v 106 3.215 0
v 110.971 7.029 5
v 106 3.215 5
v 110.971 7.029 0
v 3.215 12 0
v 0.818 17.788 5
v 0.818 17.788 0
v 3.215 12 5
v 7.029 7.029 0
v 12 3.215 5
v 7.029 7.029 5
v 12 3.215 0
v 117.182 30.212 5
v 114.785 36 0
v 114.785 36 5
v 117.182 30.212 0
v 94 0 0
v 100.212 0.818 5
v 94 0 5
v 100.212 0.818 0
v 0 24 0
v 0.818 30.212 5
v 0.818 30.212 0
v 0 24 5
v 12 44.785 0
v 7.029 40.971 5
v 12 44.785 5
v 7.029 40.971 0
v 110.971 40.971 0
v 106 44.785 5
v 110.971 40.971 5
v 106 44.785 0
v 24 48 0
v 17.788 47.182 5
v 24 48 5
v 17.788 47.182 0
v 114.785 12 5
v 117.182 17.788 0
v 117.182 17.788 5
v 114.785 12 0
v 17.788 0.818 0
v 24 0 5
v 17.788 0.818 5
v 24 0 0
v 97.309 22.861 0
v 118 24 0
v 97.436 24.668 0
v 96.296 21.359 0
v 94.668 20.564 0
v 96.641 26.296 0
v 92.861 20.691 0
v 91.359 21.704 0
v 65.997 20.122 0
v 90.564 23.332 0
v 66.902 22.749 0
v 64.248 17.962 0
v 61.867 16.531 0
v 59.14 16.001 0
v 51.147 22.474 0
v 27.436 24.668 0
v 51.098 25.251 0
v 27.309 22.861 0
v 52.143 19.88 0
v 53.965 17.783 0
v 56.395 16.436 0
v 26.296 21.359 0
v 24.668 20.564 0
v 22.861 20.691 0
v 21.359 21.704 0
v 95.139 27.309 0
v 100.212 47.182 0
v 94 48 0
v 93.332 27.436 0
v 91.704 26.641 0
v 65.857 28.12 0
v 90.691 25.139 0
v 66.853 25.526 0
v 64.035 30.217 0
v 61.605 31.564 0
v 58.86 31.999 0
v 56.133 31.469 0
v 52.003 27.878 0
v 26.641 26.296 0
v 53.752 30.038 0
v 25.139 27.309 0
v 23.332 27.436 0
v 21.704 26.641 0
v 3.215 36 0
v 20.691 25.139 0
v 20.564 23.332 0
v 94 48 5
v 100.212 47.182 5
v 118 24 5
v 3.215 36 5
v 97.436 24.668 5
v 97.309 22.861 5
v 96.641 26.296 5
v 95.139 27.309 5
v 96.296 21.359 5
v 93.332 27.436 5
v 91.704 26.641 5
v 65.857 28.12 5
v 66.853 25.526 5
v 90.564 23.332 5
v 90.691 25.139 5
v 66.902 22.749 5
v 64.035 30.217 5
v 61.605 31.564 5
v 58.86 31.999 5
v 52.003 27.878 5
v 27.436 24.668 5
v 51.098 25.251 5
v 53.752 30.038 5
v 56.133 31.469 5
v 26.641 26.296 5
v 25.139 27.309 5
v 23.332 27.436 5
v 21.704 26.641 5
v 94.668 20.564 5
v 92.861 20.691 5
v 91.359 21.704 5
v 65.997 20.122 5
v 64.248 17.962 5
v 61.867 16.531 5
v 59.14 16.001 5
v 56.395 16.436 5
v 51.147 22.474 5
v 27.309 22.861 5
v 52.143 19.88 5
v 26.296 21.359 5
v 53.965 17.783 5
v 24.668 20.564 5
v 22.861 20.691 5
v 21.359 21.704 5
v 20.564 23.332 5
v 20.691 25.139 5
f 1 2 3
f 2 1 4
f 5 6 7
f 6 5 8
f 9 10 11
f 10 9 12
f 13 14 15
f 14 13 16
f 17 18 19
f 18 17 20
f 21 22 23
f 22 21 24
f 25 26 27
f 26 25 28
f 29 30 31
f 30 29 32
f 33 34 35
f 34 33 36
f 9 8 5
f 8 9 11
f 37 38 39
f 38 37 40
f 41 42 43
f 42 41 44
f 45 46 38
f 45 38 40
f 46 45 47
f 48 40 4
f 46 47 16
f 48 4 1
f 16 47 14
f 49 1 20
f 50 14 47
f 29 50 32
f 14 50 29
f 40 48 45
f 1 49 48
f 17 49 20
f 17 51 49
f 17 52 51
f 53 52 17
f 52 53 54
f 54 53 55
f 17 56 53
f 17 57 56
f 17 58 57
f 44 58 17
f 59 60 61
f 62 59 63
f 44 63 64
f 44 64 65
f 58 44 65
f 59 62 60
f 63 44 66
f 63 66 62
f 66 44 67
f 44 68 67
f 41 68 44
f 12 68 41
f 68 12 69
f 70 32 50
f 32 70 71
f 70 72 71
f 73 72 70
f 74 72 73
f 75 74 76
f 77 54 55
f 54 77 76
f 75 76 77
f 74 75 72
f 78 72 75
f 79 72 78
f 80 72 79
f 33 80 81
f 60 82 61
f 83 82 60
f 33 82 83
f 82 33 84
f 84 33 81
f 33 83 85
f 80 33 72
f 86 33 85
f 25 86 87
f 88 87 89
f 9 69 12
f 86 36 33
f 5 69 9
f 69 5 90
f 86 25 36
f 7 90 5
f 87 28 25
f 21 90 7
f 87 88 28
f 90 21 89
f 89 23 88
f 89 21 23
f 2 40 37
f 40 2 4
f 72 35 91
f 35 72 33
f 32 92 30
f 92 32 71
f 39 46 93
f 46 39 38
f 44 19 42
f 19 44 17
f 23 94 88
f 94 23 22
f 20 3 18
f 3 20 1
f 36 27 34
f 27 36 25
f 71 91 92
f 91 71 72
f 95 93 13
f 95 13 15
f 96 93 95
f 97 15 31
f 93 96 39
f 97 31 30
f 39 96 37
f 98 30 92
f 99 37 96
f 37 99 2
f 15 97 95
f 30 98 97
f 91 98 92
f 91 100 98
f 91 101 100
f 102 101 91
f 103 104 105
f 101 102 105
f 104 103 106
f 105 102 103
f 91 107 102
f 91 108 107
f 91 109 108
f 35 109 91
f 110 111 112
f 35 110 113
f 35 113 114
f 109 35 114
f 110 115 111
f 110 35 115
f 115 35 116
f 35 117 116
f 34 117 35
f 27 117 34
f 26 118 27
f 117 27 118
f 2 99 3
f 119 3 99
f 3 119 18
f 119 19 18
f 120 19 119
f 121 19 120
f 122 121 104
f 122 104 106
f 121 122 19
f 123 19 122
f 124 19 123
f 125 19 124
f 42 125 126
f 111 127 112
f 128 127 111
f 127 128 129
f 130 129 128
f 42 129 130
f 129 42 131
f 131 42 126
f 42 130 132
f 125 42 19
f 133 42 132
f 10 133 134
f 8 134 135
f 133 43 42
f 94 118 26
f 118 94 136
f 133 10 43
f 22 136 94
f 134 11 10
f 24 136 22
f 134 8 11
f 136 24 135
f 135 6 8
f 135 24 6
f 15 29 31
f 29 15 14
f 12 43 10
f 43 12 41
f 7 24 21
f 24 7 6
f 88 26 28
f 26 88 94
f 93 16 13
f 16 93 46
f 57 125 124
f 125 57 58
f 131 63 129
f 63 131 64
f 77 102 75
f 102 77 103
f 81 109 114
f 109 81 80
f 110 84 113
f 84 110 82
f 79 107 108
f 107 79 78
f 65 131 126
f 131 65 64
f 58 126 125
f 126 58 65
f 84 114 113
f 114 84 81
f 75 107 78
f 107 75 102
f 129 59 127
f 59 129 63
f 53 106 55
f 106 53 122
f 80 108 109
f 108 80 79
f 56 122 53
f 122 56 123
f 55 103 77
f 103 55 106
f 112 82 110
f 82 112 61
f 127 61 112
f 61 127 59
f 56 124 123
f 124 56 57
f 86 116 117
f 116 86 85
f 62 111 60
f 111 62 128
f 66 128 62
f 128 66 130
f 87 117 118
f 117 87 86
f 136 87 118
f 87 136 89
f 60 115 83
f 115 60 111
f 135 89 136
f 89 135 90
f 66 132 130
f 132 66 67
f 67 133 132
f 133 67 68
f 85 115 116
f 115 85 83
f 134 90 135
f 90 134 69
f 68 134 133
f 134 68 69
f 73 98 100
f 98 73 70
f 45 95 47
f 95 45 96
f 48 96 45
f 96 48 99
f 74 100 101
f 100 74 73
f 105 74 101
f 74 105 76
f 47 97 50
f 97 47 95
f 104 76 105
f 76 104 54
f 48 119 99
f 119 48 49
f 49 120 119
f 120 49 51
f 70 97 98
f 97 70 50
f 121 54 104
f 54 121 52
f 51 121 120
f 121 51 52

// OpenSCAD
$fn = 32;

// ----------------------------------------------------------------------
// Spacer plate: obround span 70, caps R24
// ----------------------------------------------------------------------

// --- parameters (mm) ---
bore_r = 8;               // centre bore radius
bolt_r = 3.5;             // bolt hole radius
plate_t = 5;              // plate thickness, Z (extrusion height)
span = 70;                // obround span
cap_r = 24;               // cap radius

profile = [[24, 48], [17.788, 47.182], [12, 44.785], [7.029, 40.971], [3.215, 36], [0.818, 30.212], [0, 24], [0.818, 17.788], [3.215, 12], [7.029, 7.029], [12, 3.215], [17.788, 0.818], [24, 0], [94, 0], [100.212, 0.818], [106, 3.215], [110.971, 7.029], [114.785, 12], [117.182, 17.788], [118, 24], [117.182, 30.212], [114.785, 36], [110.971, 40.971], [106, 44.785], [100.212, 47.182], [94, 48]];  // primary outline, 26 points, counter clockwise
void_1 = [[66.853, 25.526], [65.857, 28.12], [64.035, 30.217], [61.605, 31.564], [58.86, 31.999], [56.133, 31.469], [53.752, 30.038], [52.003, 27.878], [51.098, 25.251], [51.147, 22.474], [52.143, 19.88], [53.965, 17.783], [56.395, 16.436], [59.14, 16.001], [61.867, 16.531], [64.248, 17.962], [65.997, 20.122], [66.902, 22.749]];  // centre bore, 18 points
void_2 = [[27.436, 24.668], [26.641, 26.296], [25.139, 27.309], [23.332, 27.436], [21.704, 26.641], [20.691, 25.139], [20.564, 23.332], [21.359, 21.704], [22.861, 20.691], [24.668, 20.564], [26.296, 21.359], [27.309, 22.861]];  // end hole, 12 points
void_3 = [[97.436, 24.668], [96.641, 26.296], [95.139, 27.309], [93.332, 27.436], [91.704, 26.641], [90.691, 25.139], [90.564, 23.332], [91.359, 21.704], [92.861, 20.691], [94.668, 20.564], [96.296, 21.359], [97.309, 22.861]];  // end hole, 12 points

// --- the one profile operation ---
difference() {
  linear_extrude(height = plate_t) polygon(points = profile);
  translate([0, 0, -1])
    linear_extrude(height = plate_t + 2) polygon(points = void_1);
  translate([0, 0, -1])
    linear_extrude(height = plate_t + 2) polygon(points = void_2);
  translate([0, 0, -1])
    linear_extrude(height = plate_t + 2) polygon(points = void_3);
}
